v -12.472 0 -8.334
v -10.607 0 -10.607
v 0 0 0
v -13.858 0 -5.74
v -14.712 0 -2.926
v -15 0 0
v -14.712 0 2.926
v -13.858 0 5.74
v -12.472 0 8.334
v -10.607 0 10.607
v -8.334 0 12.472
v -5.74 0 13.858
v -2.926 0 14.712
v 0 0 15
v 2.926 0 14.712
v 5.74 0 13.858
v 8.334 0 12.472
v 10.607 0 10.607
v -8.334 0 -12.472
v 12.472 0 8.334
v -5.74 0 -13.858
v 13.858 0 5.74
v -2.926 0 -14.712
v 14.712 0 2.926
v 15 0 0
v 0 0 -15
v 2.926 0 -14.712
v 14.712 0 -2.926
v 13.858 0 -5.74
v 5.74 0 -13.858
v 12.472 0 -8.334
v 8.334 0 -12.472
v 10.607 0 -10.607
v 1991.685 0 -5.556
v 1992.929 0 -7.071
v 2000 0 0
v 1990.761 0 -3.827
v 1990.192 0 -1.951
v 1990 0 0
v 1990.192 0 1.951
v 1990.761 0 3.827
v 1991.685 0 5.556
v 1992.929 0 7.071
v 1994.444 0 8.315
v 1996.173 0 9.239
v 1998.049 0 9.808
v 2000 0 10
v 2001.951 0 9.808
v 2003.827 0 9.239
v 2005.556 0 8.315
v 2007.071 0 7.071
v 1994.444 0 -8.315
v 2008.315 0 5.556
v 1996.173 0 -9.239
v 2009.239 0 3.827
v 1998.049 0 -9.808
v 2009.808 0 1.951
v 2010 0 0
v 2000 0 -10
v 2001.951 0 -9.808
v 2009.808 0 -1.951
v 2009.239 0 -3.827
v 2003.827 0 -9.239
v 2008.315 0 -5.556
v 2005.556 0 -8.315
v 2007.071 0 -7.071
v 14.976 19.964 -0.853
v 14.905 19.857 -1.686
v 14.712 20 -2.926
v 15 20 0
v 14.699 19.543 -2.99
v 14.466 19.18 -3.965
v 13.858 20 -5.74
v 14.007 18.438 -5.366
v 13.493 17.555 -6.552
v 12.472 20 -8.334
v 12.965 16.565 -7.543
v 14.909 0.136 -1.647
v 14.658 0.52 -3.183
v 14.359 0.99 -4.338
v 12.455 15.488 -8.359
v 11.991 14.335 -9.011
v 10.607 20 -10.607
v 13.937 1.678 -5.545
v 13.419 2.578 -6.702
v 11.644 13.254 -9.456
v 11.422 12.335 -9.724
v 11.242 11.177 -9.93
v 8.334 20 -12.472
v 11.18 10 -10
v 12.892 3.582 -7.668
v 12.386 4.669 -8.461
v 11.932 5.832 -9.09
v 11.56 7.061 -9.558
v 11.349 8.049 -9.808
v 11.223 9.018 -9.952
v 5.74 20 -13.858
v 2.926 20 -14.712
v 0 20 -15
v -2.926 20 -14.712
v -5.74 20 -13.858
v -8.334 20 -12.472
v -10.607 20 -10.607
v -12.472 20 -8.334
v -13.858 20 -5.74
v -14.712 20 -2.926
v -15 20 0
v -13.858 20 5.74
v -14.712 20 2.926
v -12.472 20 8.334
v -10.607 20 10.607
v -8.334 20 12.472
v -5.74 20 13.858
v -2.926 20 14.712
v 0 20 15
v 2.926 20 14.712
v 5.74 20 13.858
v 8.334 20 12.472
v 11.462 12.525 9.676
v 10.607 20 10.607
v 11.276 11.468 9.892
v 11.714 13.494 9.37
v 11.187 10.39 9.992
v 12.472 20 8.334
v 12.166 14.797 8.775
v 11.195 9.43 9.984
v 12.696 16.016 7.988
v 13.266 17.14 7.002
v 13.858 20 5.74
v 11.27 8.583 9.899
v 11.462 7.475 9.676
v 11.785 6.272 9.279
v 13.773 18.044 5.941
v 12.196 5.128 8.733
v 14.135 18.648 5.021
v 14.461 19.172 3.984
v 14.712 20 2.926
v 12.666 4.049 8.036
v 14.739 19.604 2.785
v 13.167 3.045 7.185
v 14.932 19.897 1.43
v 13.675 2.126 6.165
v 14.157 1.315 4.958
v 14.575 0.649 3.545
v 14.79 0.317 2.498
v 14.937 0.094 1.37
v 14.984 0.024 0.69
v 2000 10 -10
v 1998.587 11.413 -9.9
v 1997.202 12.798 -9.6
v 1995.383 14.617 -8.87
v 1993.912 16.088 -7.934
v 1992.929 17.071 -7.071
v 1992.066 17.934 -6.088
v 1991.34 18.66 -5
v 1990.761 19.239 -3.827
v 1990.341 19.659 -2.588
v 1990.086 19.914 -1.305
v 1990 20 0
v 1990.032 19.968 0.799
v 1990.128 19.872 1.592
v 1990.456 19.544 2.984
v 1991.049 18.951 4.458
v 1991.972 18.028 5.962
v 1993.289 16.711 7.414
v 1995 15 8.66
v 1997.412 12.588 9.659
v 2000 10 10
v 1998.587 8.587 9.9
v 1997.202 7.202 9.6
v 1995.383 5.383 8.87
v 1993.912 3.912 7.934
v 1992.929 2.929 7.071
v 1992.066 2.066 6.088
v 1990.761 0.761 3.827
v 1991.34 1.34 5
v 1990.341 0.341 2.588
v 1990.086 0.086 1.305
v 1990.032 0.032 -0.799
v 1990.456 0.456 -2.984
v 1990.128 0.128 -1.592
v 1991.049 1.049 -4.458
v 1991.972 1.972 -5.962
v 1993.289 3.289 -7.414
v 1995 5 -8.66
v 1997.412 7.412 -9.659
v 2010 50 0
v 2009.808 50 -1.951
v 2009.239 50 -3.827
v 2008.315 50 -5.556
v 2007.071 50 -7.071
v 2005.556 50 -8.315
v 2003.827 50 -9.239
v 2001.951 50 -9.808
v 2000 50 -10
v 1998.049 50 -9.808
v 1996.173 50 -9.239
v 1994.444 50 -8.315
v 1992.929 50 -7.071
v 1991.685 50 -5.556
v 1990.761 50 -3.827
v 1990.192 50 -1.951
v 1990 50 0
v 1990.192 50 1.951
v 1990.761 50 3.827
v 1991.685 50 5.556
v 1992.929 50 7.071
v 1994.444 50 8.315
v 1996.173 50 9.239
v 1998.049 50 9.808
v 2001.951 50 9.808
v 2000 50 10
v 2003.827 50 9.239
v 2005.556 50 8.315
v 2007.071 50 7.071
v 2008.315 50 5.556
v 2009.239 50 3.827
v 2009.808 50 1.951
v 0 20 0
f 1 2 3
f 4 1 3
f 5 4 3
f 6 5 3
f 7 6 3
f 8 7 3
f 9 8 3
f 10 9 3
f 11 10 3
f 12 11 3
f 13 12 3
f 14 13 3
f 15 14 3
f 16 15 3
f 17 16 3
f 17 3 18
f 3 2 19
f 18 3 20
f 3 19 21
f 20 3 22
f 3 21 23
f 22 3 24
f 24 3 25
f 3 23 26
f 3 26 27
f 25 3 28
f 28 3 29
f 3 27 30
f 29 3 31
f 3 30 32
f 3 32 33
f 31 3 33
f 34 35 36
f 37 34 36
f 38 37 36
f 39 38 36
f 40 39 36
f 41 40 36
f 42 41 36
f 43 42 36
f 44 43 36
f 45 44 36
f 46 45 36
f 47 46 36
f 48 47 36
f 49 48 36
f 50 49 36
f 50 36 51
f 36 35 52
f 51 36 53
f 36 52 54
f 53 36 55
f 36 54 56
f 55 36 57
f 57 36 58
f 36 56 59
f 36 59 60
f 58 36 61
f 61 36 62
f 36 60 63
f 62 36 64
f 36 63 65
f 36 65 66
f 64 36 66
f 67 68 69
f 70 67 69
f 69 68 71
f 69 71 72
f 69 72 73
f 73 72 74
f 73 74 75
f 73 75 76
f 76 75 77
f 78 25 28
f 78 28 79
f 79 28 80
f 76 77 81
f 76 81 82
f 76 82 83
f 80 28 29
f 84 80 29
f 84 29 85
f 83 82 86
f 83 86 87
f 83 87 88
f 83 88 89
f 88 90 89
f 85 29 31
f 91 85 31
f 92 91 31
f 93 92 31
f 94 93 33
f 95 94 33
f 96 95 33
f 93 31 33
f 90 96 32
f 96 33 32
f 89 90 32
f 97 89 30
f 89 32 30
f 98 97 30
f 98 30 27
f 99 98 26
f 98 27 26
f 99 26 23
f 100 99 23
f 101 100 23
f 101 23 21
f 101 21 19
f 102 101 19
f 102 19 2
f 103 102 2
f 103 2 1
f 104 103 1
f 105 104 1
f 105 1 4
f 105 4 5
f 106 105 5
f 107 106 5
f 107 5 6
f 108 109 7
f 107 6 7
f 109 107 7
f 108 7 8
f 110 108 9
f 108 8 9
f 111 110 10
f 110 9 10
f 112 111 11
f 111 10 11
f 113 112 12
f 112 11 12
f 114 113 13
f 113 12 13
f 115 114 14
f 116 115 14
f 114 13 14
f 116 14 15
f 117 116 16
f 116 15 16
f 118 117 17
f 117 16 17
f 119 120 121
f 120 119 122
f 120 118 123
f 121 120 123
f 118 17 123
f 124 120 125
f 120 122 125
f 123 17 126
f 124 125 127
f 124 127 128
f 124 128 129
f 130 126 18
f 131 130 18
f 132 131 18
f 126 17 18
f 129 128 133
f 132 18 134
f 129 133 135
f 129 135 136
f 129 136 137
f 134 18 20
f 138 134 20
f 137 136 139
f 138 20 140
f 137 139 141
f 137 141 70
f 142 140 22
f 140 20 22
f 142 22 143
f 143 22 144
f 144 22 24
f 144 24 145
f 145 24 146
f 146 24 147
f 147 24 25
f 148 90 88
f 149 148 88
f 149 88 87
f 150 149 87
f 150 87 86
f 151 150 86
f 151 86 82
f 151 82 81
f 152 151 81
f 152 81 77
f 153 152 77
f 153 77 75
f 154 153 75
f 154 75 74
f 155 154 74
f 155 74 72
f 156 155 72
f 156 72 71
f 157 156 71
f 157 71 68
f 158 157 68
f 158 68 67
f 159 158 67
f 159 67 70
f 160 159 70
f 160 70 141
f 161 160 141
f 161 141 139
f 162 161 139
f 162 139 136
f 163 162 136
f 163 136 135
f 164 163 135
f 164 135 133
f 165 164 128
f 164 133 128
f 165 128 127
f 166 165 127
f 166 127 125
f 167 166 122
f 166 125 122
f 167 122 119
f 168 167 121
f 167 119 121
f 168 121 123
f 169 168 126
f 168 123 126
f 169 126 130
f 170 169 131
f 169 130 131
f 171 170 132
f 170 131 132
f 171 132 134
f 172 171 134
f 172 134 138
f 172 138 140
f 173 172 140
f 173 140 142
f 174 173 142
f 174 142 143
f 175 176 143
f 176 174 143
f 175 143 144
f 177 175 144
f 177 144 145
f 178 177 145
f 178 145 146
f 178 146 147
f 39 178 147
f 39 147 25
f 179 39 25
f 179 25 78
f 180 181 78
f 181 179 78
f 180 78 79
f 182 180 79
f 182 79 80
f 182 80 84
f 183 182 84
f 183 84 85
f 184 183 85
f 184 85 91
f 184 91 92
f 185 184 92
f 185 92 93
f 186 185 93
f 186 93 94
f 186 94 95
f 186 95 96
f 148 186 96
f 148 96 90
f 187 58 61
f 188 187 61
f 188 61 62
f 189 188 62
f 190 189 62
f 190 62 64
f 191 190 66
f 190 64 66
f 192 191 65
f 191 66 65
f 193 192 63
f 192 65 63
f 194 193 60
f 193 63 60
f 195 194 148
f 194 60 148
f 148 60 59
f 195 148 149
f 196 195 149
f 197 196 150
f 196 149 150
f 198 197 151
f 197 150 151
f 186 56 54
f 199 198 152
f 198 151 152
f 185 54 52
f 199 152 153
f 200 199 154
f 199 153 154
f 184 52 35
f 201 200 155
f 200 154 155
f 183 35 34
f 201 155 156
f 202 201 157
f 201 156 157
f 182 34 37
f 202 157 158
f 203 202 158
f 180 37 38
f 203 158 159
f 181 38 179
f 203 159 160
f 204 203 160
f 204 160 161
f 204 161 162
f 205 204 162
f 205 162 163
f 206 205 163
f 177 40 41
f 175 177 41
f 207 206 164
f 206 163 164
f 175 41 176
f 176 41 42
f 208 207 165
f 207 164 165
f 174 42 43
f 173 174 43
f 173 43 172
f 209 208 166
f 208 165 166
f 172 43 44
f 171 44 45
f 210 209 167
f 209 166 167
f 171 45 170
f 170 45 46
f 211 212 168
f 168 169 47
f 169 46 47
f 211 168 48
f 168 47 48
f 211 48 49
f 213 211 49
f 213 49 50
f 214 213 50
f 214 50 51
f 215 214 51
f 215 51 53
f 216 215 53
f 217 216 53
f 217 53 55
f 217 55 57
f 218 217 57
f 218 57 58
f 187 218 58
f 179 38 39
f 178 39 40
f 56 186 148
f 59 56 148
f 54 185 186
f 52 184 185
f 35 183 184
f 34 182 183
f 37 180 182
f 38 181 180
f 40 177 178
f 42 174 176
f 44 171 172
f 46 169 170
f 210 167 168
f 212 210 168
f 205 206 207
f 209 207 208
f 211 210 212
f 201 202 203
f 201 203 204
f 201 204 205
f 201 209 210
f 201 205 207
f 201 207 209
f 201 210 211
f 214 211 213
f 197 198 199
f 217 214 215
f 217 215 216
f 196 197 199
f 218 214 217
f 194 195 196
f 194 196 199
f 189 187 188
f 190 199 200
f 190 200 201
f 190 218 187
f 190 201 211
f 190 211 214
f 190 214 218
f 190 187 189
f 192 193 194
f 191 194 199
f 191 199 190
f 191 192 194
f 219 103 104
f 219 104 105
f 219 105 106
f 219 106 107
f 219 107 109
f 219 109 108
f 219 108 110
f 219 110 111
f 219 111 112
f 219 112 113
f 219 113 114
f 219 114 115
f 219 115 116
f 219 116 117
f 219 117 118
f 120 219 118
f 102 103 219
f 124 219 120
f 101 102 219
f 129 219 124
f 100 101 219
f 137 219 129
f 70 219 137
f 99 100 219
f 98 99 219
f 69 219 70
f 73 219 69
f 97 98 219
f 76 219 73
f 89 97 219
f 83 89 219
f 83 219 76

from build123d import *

# Parameters (mm, degrees)
SKETCH1_R           = 15
BOSS_EXTRUDE1_DEPTH = 20
SKETCH2_R           = 10
BOSS_EXTRUDE2_DEPTH = 2000
SKETCH3_R           = 10
BOSS_EXTRUDE3_DEPTH = 50


with BuildPart() as part:
    # Sketch1 → Boss-Extrude1 (new body)
    with BuildSketch(Plane(origin=(0, 0, 0), x_dir=(1, 0, 0), z_dir=(0, 1, 0))):
        Circle(SKETCH1_R)
    extrude(amount=BOSS_EXTRUDE1_DEPTH)

    # Sketch2 → Boss-Extrude2 (add)
    with BuildSketch(Plane(origin=(0, 0, 0), x_dir=(0, 0, -1), z_dir=(1, 0, 0))):
        with Locations((0, 10)):
            Circle(SKETCH2_R)
    extrude(amount=BOSS_EXTRUDE2_DEPTH)

    # Sketch3 → Boss-Extrude3 (add)
    with BuildSketch(Plane(origin=(0, 0, 0), x_dir=(1, 0, 0), z_dir=(0, 1, 0))):
        with Locations((2000, 0)):
            Circle(SKETCH3_R)
    extrude(amount=BOSS_EXTRUDE3_DEPTH)


solid = part.part
